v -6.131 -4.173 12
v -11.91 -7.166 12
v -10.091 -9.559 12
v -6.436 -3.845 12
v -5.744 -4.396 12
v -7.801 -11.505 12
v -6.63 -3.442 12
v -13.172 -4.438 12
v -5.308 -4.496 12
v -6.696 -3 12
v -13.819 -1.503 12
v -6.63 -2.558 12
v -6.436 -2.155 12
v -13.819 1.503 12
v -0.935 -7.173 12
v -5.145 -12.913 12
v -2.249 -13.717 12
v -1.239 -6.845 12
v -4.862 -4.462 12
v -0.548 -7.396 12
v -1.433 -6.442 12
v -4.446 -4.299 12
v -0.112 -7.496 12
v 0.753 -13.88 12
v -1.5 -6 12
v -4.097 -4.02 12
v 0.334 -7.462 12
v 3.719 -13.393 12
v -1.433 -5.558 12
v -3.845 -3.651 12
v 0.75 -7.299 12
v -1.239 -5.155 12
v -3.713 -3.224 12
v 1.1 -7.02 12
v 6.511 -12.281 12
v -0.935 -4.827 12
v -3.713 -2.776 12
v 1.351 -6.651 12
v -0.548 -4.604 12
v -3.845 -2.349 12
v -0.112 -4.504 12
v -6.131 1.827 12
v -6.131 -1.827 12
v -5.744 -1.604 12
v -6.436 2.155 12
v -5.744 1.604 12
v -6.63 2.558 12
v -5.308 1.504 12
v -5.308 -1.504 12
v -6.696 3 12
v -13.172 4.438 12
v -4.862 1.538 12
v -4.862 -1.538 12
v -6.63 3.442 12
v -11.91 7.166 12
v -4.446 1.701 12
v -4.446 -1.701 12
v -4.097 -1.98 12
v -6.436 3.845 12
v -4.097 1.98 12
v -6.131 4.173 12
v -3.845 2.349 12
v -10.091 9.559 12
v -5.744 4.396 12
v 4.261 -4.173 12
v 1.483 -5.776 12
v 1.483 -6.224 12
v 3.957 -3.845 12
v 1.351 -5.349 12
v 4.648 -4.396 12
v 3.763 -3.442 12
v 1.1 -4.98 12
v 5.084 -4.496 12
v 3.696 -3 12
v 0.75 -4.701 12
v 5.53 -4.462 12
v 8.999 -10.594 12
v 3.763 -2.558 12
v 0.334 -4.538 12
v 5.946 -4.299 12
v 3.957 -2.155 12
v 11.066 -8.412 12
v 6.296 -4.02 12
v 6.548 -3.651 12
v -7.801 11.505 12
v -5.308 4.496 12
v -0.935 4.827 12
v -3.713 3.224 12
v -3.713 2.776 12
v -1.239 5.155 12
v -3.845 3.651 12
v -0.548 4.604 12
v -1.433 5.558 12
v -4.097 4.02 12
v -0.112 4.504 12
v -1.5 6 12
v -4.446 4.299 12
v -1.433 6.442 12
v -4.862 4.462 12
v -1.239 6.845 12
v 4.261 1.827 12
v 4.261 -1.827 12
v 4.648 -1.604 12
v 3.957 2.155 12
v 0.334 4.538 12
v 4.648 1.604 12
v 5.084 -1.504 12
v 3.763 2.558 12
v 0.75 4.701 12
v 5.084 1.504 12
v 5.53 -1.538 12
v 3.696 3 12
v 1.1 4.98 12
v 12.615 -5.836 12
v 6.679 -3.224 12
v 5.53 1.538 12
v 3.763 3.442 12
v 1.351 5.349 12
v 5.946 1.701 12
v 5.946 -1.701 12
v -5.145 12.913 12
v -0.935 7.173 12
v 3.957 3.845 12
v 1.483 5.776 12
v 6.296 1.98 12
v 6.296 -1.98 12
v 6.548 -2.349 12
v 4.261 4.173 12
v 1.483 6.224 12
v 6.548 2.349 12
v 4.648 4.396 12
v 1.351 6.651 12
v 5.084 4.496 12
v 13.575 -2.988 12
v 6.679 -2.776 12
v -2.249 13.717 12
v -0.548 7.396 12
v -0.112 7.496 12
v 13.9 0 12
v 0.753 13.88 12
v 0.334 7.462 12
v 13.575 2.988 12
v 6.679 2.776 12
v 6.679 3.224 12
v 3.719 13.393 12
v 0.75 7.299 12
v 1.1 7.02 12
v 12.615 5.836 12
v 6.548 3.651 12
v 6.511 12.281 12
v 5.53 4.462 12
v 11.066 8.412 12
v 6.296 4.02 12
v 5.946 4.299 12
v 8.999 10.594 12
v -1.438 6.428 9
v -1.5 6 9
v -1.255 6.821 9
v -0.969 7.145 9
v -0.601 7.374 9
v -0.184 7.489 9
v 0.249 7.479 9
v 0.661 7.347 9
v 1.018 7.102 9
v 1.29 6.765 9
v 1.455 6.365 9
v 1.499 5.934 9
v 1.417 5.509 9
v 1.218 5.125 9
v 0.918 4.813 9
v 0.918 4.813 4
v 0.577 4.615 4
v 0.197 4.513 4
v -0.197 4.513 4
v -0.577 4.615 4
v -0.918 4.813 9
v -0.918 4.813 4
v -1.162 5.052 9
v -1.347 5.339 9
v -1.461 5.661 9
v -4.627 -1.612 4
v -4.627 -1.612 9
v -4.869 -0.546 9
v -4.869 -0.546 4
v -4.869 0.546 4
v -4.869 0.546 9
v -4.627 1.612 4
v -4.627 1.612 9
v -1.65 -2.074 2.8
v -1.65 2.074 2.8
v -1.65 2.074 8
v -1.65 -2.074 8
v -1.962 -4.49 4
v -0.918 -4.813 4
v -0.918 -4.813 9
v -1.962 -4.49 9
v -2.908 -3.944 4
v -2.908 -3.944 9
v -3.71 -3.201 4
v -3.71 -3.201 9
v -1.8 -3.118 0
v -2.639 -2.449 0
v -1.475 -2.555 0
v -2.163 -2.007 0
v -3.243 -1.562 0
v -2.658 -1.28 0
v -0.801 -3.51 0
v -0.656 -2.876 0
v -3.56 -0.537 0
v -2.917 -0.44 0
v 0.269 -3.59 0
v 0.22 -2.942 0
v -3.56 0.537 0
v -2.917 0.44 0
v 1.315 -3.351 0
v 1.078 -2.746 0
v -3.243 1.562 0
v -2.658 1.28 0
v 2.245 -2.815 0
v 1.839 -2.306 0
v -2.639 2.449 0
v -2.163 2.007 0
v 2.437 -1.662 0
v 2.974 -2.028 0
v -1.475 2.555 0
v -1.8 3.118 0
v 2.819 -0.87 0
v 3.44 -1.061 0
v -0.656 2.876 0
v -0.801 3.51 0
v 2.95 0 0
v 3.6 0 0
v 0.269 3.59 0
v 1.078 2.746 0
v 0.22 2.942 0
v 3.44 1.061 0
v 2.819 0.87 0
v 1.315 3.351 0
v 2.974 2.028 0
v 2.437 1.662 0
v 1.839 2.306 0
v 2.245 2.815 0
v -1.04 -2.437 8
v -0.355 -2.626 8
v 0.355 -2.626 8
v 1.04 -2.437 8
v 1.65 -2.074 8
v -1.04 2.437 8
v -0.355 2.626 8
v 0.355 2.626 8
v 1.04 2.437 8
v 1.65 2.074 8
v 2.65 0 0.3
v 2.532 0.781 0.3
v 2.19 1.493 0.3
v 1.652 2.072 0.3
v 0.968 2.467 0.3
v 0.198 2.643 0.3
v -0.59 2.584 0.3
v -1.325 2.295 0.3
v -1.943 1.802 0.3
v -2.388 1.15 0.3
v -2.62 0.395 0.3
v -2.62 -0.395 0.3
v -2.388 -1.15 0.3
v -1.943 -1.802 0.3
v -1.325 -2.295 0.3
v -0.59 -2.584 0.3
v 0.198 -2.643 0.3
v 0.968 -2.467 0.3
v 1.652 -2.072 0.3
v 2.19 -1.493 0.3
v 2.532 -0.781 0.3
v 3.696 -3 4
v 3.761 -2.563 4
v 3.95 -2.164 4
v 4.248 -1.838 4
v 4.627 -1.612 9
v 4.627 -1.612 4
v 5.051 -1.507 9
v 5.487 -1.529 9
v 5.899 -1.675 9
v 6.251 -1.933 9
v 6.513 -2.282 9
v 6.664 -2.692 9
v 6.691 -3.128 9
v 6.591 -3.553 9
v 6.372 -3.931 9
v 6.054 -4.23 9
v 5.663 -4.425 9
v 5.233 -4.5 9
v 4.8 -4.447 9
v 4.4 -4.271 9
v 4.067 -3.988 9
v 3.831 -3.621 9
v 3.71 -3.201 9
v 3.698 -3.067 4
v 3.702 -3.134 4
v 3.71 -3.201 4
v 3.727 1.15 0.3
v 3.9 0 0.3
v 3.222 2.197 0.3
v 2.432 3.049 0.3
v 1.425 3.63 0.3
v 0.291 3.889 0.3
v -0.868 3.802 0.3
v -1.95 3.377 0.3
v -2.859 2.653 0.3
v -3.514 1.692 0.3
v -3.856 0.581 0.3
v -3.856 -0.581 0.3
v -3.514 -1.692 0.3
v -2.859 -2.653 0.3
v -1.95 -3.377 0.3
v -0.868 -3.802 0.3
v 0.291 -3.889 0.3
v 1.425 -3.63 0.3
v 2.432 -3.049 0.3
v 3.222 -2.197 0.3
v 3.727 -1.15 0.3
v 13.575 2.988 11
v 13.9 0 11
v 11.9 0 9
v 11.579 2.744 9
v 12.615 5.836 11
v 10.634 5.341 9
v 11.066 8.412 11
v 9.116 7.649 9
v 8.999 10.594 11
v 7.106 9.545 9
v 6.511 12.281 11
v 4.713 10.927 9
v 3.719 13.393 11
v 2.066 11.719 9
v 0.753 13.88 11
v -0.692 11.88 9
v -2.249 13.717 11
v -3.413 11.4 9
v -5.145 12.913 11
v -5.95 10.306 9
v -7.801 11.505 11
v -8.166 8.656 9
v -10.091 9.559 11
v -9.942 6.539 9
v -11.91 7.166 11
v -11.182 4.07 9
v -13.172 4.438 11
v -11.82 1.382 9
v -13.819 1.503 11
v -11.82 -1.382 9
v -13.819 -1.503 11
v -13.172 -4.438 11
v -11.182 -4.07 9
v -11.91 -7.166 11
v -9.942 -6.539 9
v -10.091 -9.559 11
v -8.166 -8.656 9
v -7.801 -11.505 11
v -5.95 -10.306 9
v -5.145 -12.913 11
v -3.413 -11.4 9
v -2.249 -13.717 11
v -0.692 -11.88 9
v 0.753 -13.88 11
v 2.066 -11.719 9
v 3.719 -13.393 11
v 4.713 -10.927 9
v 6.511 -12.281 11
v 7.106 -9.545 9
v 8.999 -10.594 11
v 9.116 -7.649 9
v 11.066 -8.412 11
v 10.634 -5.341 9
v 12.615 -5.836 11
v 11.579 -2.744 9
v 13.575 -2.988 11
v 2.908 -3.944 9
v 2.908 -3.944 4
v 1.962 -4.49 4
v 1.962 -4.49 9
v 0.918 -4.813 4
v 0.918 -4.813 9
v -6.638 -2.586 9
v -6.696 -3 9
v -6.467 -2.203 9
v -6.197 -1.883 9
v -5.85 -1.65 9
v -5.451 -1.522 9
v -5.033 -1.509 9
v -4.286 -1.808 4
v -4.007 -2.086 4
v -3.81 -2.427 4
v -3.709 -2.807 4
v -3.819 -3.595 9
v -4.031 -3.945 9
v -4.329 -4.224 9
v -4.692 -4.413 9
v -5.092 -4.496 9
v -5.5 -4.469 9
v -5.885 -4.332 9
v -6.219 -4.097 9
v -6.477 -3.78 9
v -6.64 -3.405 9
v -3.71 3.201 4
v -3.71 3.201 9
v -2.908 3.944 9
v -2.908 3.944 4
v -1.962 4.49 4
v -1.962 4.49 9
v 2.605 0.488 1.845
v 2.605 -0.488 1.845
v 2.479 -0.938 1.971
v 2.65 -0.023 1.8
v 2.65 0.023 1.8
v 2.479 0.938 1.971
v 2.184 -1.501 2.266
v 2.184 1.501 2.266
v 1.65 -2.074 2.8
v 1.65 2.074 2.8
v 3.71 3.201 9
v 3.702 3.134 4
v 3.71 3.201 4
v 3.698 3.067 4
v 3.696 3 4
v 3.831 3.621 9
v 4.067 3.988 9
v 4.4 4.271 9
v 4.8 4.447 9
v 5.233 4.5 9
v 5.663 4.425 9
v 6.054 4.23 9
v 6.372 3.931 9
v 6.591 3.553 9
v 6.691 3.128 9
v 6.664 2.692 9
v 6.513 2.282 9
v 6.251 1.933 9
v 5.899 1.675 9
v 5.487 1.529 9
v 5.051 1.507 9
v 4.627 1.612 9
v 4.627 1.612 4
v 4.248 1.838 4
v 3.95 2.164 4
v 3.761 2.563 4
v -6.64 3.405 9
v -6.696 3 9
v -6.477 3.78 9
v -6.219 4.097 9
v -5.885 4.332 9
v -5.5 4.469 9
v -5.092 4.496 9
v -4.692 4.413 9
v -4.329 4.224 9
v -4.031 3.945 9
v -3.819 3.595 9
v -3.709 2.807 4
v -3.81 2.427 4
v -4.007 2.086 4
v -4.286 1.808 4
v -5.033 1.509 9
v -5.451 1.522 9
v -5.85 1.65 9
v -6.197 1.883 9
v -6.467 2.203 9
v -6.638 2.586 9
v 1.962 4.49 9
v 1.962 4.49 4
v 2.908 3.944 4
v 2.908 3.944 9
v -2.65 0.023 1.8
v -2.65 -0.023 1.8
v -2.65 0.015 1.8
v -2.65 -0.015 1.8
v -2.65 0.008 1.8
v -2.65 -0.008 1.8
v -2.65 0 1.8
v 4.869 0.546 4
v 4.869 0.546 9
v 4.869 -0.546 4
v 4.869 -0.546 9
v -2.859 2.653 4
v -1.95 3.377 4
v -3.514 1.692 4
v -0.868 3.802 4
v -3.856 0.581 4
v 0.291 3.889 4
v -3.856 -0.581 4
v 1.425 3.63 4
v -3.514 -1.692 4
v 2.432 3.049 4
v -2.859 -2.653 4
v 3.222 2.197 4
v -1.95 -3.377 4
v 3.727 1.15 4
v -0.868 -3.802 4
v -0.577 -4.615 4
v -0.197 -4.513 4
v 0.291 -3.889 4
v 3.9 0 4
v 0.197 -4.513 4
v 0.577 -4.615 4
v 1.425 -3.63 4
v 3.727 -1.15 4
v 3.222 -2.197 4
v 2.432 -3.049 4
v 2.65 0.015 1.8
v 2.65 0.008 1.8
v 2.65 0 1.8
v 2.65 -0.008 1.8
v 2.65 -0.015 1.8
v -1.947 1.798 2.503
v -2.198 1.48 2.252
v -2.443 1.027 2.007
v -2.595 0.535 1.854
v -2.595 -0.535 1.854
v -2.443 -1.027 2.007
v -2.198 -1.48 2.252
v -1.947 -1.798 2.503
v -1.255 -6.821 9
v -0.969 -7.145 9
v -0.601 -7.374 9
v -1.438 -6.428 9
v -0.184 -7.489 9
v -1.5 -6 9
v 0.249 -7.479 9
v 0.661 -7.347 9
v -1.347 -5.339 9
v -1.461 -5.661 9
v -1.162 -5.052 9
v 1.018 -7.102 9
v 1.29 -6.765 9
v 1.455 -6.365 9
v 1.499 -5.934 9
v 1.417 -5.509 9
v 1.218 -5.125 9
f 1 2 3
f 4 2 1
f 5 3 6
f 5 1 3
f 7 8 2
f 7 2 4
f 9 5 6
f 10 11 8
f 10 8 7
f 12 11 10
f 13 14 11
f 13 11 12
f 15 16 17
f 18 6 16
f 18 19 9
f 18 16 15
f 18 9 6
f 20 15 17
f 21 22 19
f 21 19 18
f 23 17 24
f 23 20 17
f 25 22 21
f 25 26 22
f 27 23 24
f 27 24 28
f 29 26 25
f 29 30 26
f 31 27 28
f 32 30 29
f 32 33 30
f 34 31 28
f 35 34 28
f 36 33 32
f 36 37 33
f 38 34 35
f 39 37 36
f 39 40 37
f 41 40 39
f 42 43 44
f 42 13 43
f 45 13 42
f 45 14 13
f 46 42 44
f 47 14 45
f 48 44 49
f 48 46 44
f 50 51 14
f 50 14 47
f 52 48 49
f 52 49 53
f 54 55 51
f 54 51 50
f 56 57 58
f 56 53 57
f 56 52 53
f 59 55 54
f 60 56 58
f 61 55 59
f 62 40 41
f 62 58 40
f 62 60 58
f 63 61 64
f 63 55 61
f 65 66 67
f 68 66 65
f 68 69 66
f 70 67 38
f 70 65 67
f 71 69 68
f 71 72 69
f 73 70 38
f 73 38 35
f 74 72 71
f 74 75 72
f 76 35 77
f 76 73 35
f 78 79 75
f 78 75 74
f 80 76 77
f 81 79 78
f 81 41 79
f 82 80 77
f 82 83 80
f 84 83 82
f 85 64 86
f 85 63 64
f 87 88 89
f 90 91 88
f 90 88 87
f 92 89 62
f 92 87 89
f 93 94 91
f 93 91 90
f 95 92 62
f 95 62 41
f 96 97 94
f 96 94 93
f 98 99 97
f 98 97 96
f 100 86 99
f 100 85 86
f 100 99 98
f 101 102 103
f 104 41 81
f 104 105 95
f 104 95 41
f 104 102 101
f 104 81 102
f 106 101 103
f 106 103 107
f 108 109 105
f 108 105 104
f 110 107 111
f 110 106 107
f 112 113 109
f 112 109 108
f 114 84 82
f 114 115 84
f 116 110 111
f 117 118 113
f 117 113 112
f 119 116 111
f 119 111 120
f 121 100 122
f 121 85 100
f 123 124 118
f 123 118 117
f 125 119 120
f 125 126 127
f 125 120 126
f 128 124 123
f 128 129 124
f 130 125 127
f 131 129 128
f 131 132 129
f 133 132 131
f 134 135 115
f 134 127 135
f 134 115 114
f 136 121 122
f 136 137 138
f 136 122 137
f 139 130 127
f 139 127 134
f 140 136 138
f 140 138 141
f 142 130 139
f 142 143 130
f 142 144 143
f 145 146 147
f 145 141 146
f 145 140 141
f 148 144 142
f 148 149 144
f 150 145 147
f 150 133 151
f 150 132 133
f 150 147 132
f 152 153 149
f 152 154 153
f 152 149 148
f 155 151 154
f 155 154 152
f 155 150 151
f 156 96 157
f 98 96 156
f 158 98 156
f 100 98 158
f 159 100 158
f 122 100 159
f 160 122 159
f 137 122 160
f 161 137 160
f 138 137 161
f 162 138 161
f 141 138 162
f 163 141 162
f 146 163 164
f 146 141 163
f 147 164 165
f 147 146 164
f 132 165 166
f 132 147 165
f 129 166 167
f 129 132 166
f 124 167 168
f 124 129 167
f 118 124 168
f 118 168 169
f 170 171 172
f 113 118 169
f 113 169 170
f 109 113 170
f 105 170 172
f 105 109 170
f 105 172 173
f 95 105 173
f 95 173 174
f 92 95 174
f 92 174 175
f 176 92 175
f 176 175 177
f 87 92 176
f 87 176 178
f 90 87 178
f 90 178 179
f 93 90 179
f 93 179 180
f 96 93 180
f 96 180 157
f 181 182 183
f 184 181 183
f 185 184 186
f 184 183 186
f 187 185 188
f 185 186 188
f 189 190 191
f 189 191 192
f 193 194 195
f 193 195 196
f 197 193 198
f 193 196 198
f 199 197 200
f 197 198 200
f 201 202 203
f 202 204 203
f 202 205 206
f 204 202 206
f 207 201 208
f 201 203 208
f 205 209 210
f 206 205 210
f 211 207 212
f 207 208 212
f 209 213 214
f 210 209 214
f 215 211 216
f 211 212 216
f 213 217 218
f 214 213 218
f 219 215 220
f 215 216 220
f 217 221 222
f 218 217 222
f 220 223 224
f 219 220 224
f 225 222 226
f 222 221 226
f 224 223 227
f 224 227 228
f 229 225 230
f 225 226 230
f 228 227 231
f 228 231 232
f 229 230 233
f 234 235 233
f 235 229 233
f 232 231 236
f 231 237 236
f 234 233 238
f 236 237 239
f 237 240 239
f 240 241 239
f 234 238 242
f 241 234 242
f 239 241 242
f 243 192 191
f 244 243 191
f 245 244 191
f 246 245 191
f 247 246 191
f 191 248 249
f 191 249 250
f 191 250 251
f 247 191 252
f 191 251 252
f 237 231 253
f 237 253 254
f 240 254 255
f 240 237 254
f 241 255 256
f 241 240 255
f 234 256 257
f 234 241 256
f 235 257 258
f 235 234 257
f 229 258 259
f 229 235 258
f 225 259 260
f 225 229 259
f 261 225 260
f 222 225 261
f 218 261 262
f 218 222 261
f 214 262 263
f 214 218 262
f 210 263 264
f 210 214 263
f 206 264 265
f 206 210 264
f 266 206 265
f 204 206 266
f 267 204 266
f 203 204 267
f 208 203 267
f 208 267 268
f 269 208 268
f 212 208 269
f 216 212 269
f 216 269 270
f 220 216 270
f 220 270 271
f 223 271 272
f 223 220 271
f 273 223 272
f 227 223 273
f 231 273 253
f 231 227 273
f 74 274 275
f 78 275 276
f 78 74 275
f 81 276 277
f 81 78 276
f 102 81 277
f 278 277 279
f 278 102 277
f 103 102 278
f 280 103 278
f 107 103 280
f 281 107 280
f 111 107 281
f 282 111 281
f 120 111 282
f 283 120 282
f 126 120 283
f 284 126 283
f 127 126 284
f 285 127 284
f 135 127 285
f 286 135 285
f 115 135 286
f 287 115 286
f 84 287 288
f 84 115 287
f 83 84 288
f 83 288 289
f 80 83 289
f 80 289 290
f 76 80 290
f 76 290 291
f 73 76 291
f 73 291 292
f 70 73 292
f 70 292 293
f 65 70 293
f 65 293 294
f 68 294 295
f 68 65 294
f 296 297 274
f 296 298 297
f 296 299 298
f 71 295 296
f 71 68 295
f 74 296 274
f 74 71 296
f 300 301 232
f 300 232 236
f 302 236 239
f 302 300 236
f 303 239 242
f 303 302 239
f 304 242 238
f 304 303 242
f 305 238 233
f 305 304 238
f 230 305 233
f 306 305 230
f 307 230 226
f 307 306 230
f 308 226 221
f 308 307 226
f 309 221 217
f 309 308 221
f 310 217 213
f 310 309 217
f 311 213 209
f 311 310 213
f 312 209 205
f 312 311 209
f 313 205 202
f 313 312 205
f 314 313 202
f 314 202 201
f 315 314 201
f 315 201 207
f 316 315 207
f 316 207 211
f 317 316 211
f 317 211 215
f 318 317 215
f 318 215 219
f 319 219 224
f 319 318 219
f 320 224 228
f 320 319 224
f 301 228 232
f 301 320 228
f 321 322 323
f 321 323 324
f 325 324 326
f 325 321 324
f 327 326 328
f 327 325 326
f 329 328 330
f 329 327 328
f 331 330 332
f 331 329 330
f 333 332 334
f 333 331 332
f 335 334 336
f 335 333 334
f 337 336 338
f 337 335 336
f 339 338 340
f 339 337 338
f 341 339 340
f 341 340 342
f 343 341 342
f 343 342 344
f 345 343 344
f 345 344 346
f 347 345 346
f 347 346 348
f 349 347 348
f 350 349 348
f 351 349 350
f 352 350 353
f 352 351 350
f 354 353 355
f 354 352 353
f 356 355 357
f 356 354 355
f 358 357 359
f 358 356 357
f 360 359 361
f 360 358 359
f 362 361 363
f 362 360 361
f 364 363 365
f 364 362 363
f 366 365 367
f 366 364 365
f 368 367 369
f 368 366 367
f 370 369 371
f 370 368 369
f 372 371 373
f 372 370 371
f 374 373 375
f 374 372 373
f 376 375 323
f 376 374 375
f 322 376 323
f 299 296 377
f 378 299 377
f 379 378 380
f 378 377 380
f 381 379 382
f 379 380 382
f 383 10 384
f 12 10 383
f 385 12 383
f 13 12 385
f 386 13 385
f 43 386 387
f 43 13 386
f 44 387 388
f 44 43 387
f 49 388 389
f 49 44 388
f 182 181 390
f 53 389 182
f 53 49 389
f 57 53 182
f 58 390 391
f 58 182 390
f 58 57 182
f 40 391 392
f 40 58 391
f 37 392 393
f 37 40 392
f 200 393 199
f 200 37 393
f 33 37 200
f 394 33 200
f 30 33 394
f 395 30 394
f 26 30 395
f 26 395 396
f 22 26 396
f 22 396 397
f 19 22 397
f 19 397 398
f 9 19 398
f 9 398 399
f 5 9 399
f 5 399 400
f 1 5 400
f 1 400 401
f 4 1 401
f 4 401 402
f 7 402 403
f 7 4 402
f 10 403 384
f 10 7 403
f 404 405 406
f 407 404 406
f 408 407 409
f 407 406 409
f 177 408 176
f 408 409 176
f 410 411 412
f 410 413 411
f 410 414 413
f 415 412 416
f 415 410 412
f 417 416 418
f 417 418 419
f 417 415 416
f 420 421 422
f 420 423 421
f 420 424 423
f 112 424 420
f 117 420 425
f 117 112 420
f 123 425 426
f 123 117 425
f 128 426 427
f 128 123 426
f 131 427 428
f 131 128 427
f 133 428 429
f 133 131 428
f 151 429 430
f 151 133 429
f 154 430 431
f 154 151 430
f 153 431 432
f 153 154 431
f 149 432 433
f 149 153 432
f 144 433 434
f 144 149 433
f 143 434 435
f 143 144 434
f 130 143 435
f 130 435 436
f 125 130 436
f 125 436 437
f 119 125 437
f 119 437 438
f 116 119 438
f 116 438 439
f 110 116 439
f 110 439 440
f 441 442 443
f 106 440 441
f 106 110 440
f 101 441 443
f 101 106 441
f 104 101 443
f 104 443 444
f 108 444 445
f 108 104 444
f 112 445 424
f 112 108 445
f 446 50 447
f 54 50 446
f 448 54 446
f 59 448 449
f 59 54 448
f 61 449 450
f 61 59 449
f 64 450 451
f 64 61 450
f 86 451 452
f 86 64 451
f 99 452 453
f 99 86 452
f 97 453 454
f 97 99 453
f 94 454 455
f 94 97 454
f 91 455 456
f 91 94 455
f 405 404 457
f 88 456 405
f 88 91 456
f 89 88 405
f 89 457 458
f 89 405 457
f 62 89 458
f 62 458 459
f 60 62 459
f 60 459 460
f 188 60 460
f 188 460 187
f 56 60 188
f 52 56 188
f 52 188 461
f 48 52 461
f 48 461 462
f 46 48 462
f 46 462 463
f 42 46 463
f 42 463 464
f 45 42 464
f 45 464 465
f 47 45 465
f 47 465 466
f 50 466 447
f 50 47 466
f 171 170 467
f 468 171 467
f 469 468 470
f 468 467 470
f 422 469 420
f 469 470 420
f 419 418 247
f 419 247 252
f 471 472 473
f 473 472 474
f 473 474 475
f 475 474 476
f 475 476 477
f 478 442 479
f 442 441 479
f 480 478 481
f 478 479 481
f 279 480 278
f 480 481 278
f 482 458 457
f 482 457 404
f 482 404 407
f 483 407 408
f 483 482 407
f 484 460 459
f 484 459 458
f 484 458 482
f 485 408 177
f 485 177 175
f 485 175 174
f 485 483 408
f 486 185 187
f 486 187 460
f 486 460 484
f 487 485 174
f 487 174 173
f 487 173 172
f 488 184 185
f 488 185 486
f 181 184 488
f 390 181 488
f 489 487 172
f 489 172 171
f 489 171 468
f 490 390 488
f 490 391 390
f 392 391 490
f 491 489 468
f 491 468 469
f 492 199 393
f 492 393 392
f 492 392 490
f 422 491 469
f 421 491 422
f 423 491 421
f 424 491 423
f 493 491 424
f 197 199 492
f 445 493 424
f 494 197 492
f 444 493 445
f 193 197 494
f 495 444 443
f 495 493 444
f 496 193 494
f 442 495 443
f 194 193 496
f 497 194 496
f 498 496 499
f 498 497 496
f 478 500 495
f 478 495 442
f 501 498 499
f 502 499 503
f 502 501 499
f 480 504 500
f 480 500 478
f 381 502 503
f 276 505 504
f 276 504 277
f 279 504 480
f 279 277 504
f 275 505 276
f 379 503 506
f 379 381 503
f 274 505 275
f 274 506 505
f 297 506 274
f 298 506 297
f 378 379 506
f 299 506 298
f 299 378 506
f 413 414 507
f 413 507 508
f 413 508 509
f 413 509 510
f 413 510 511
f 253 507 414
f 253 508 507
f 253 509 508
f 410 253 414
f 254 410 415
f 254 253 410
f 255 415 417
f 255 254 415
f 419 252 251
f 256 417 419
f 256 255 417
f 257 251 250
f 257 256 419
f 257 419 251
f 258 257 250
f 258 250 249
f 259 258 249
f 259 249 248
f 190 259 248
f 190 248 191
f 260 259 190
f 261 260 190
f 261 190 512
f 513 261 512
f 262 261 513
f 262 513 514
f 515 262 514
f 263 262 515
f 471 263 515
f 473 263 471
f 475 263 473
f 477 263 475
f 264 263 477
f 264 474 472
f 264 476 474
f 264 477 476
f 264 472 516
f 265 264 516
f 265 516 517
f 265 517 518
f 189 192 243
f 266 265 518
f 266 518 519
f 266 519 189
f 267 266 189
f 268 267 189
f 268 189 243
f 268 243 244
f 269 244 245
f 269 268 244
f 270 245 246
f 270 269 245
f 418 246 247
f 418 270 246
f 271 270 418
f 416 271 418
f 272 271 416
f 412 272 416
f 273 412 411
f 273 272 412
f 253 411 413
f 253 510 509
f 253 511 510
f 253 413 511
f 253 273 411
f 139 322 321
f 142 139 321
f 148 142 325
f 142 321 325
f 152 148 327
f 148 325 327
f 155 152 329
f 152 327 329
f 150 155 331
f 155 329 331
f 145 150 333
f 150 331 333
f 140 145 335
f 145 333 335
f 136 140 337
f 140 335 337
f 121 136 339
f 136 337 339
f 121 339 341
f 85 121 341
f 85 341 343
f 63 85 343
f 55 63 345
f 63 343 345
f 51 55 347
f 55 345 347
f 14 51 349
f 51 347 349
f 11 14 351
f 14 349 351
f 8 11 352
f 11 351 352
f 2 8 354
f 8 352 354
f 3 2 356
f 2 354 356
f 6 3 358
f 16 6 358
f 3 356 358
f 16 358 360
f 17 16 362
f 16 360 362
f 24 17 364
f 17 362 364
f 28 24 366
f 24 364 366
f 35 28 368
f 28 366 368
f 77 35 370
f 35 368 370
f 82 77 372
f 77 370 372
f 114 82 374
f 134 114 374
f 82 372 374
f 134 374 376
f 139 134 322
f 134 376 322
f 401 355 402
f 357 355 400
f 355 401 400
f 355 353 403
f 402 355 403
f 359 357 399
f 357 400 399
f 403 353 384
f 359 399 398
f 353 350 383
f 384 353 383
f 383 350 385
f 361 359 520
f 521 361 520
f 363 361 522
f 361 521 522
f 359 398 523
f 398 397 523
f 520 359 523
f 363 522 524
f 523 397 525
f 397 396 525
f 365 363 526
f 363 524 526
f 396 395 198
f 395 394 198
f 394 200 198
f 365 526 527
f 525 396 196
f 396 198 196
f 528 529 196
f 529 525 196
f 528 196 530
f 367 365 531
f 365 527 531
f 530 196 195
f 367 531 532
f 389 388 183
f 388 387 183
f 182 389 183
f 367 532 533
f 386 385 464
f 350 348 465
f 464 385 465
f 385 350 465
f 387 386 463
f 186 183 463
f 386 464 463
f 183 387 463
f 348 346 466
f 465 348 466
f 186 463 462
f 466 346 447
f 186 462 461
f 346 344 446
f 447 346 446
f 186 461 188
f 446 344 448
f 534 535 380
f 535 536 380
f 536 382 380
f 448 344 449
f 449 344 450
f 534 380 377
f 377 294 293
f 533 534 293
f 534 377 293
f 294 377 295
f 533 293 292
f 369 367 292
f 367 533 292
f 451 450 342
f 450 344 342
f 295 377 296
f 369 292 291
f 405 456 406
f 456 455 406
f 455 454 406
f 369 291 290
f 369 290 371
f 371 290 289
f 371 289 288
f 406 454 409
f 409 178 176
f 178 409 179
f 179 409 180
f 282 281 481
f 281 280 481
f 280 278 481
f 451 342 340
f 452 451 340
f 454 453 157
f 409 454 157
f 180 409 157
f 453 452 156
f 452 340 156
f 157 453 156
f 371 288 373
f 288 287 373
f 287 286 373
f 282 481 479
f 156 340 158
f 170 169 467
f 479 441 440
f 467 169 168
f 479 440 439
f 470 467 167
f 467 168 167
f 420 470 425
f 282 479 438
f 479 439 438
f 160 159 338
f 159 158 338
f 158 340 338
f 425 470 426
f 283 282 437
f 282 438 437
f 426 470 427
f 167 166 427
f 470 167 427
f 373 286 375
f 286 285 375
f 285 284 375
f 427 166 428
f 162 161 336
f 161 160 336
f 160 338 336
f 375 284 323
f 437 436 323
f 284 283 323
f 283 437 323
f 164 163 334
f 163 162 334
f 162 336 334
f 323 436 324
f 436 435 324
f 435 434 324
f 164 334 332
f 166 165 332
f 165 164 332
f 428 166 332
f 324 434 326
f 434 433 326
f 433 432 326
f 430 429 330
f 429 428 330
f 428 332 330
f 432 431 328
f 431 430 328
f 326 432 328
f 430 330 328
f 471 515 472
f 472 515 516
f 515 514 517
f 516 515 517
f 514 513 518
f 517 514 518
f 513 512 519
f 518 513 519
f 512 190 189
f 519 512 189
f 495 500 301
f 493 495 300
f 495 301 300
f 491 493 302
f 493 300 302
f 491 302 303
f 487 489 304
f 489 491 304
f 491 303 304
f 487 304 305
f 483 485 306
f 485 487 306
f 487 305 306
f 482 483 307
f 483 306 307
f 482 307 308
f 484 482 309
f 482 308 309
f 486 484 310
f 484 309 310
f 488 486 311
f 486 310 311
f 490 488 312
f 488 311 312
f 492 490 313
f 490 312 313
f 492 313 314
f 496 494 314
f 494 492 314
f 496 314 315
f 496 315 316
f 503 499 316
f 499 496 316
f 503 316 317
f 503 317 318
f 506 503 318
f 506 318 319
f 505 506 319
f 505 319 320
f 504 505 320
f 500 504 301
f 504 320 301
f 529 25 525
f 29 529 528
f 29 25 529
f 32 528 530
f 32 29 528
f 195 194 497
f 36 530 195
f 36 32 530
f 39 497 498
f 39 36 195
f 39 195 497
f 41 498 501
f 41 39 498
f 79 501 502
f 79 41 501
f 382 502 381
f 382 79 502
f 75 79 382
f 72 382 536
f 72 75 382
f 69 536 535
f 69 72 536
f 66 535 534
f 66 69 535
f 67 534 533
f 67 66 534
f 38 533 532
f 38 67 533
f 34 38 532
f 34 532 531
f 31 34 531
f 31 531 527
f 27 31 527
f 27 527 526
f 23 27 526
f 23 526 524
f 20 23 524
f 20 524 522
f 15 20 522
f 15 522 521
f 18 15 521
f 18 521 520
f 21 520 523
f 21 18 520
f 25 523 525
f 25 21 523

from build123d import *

# Parameters (mm, degrees)
SKETCH_1_R               = 3.9
SKETCH_1_R_2             = 2.65
EXTRUDE_1_DEPTH          = 11
EXTRUDE_START            = -3
SKETCH_2_R               = 2.65
EXTRUDE_2_DEPTH          = 3
EXTRUDE_START_2          = 6.2
EXTRUDE_3_DEPTH          = 6.2
CHAMFER_1_SIZE           = 0.3
CHAMFER_2_SIZE           = 0.3
EXTRUDE_4_DEPTH          = 1
EXTRUDE_4_DEPTH_BACK     = 2
SKETCH_4_R               = 13.9
SKETCH_5_R               = 4.9
SKETCH_5_R_2             = 3.7
EXTRUDE_5_DEPTH          = 5
CHAMFER_4_SIZE           = 2
CUT_EXTRUDE_1_DEPTH      = 22.619898242
CUT_EXTRUDE_1_DEPTH_BACK = 22.619898242
SKETCH_6_R               = 1.5
CHAMFER_5_SIZE           = 1
CHAMFER_6_SIZE           = 1


with BuildPart() as part:
    # 草图1 → 凸台-拉伸1 (new body)
    with BuildSketch(Plane.XY):
        Circle(SKETCH_1_R)
        Circle(SKETCH_1_R_2, mode=Mode.SUBTRACT)
    extrude(amount=EXTRUDE_1_DEPTH)

    # 草图2 → 凸台-拉伸2 (add)
    with BuildSketch(Plane.XY.offset(11).offset(EXTRUDE_START)):
        Circle(SKETCH_2_R)
    extrude(amount=EXTRUDE_2_DEPTH)

    # 草图3 → 凸台-拉伸3 (add)
    with BuildSketch(Plane(origin=(0, 0, 8), x_dir=(-1, 0, 0), z_dir=(0, 0, -1)).offset(EXTRUDE_START_2)):
        with BuildLine():
            Line((-1.65, -2.073644135), (-1.65, 2.073644135))
            ThreePointArc((-1.65, 2.073644135), (-2.65, 0), (-1.65, -2.073644135))
        make_face()
        with BuildLine():
            ThreePointArc((2.65, 0), (2.386943652, 1.151086443), (1.65, 2.073644135))
            Line((1.65, 2.073644135), (1.65, -2.073644135))
            ThreePointArc((1.65, -2.073644135), (2.386943652, -1.151086443), (2.65, 0))
        make_face()
    extrude(amount=-EXTRUDE_3_DEPTH)

    # 倒角1
    chamfer_1_edges = [part.edges().sort_by_distance(p)[0] for p in [
        (-2.65, 0, 0),
    ]]
    chamfer(chamfer_1_edges, length=CHAMFER_1_SIZE)

    # 倒角2
    chamfer_2_edges = [part.edges().sort_by_distance(p)[0] for p in [
        (-3.9, 0, 0),
    ]]
    chamfer(chamfer_2_edges, length=CHAMFER_2_SIZE)

    # 草图4 → 凸台-拉伸4 (add, two sides: drawn at the far end of the back side and taken through both)
    with BuildSketch(Plane.XY.offset(11).offset(-EXTRUDE_4_DEPTH_BACK)):
        Circle(SKETCH_4_R)
    extrude(amount=EXTRUDE_4_DEPTH + EXTRUDE_4_DEPTH_BACK)

    # 草图5 → 凸台-拉伸5 (add)
    with BuildSketch(Plane(origin=(0, 0, 9), x_dir=(-1, 0, 0), z_dir=(0, 0, -1))):
        with Locations(Location((0, 0, 0), (0, 0, 180))):
            Circle(SKETCH_5_R)
        Circle(SKETCH_5_R_2, mode=Mode.SUBTRACT)
    extrude(amount=EXTRUDE_5_DEPTH)

    # 倒角4
    chamfer_4_edges = [part.edges().sort_by_distance(p)[0] for p in [
        (-13.9, 0, 9),
    ]]
    chamfer(chamfer_4_edges, length=CHAMFER_4_SIZE)

    # 草图6 → 切除-拉伸1 (cut, two sides: drawn at the far end of the back side and taken through both)
    with BuildSketch(Plane(origin=(0, 0, 9), x_dir=(-1, 0, 0), z_dir=(0, 0, -1)).offset(-CUT_EXTRUDE_1_DEPTH_BACK)):
        with Locations((0, 6)):
            Circle(SKETCH_6_R)
        with Locations((5.196152423, 3)):
            Circle(SKETCH_6_R)
        with Locations((5.196152423, -3)):
            Circle(SKETCH_6_R)
        with Locations((0, -6)):
            Circle(SKETCH_6_R)
        with Locations((-5.196152423, -3)):
            Circle(SKETCH_6_R)
        with Locations((-5.196152423, 3)):
            Circle(SKETCH_6_R)
    extrude(amount=CUT_EXTRUDE_1_DEPTH + CUT_EXTRUDE_1_DEPTH_BACK, mode=Mode.SUBTRACT)

    # 倒角5
    chamfer_5_edges = [part.edges().sort_by_distance(p)[0] for p in [
        (-1.65, 0, 1.8),
    ]]
    chamfer(chamfer_5_edges, length=CHAMFER_5_SIZE - 0.0001)  # a hair under: the kernel refuses the full size

    # 倒角6
    chamfer_6_edges = [part.edges().sort_by_distance(p)[0] for p in [
        (1.65, 0, 1.8),
    ]]
    chamfer(chamfer_6_edges, length=CHAMFER_6_SIZE - 0.0001)  # a hair under: the kernel refuses the full size


solid = part.part
